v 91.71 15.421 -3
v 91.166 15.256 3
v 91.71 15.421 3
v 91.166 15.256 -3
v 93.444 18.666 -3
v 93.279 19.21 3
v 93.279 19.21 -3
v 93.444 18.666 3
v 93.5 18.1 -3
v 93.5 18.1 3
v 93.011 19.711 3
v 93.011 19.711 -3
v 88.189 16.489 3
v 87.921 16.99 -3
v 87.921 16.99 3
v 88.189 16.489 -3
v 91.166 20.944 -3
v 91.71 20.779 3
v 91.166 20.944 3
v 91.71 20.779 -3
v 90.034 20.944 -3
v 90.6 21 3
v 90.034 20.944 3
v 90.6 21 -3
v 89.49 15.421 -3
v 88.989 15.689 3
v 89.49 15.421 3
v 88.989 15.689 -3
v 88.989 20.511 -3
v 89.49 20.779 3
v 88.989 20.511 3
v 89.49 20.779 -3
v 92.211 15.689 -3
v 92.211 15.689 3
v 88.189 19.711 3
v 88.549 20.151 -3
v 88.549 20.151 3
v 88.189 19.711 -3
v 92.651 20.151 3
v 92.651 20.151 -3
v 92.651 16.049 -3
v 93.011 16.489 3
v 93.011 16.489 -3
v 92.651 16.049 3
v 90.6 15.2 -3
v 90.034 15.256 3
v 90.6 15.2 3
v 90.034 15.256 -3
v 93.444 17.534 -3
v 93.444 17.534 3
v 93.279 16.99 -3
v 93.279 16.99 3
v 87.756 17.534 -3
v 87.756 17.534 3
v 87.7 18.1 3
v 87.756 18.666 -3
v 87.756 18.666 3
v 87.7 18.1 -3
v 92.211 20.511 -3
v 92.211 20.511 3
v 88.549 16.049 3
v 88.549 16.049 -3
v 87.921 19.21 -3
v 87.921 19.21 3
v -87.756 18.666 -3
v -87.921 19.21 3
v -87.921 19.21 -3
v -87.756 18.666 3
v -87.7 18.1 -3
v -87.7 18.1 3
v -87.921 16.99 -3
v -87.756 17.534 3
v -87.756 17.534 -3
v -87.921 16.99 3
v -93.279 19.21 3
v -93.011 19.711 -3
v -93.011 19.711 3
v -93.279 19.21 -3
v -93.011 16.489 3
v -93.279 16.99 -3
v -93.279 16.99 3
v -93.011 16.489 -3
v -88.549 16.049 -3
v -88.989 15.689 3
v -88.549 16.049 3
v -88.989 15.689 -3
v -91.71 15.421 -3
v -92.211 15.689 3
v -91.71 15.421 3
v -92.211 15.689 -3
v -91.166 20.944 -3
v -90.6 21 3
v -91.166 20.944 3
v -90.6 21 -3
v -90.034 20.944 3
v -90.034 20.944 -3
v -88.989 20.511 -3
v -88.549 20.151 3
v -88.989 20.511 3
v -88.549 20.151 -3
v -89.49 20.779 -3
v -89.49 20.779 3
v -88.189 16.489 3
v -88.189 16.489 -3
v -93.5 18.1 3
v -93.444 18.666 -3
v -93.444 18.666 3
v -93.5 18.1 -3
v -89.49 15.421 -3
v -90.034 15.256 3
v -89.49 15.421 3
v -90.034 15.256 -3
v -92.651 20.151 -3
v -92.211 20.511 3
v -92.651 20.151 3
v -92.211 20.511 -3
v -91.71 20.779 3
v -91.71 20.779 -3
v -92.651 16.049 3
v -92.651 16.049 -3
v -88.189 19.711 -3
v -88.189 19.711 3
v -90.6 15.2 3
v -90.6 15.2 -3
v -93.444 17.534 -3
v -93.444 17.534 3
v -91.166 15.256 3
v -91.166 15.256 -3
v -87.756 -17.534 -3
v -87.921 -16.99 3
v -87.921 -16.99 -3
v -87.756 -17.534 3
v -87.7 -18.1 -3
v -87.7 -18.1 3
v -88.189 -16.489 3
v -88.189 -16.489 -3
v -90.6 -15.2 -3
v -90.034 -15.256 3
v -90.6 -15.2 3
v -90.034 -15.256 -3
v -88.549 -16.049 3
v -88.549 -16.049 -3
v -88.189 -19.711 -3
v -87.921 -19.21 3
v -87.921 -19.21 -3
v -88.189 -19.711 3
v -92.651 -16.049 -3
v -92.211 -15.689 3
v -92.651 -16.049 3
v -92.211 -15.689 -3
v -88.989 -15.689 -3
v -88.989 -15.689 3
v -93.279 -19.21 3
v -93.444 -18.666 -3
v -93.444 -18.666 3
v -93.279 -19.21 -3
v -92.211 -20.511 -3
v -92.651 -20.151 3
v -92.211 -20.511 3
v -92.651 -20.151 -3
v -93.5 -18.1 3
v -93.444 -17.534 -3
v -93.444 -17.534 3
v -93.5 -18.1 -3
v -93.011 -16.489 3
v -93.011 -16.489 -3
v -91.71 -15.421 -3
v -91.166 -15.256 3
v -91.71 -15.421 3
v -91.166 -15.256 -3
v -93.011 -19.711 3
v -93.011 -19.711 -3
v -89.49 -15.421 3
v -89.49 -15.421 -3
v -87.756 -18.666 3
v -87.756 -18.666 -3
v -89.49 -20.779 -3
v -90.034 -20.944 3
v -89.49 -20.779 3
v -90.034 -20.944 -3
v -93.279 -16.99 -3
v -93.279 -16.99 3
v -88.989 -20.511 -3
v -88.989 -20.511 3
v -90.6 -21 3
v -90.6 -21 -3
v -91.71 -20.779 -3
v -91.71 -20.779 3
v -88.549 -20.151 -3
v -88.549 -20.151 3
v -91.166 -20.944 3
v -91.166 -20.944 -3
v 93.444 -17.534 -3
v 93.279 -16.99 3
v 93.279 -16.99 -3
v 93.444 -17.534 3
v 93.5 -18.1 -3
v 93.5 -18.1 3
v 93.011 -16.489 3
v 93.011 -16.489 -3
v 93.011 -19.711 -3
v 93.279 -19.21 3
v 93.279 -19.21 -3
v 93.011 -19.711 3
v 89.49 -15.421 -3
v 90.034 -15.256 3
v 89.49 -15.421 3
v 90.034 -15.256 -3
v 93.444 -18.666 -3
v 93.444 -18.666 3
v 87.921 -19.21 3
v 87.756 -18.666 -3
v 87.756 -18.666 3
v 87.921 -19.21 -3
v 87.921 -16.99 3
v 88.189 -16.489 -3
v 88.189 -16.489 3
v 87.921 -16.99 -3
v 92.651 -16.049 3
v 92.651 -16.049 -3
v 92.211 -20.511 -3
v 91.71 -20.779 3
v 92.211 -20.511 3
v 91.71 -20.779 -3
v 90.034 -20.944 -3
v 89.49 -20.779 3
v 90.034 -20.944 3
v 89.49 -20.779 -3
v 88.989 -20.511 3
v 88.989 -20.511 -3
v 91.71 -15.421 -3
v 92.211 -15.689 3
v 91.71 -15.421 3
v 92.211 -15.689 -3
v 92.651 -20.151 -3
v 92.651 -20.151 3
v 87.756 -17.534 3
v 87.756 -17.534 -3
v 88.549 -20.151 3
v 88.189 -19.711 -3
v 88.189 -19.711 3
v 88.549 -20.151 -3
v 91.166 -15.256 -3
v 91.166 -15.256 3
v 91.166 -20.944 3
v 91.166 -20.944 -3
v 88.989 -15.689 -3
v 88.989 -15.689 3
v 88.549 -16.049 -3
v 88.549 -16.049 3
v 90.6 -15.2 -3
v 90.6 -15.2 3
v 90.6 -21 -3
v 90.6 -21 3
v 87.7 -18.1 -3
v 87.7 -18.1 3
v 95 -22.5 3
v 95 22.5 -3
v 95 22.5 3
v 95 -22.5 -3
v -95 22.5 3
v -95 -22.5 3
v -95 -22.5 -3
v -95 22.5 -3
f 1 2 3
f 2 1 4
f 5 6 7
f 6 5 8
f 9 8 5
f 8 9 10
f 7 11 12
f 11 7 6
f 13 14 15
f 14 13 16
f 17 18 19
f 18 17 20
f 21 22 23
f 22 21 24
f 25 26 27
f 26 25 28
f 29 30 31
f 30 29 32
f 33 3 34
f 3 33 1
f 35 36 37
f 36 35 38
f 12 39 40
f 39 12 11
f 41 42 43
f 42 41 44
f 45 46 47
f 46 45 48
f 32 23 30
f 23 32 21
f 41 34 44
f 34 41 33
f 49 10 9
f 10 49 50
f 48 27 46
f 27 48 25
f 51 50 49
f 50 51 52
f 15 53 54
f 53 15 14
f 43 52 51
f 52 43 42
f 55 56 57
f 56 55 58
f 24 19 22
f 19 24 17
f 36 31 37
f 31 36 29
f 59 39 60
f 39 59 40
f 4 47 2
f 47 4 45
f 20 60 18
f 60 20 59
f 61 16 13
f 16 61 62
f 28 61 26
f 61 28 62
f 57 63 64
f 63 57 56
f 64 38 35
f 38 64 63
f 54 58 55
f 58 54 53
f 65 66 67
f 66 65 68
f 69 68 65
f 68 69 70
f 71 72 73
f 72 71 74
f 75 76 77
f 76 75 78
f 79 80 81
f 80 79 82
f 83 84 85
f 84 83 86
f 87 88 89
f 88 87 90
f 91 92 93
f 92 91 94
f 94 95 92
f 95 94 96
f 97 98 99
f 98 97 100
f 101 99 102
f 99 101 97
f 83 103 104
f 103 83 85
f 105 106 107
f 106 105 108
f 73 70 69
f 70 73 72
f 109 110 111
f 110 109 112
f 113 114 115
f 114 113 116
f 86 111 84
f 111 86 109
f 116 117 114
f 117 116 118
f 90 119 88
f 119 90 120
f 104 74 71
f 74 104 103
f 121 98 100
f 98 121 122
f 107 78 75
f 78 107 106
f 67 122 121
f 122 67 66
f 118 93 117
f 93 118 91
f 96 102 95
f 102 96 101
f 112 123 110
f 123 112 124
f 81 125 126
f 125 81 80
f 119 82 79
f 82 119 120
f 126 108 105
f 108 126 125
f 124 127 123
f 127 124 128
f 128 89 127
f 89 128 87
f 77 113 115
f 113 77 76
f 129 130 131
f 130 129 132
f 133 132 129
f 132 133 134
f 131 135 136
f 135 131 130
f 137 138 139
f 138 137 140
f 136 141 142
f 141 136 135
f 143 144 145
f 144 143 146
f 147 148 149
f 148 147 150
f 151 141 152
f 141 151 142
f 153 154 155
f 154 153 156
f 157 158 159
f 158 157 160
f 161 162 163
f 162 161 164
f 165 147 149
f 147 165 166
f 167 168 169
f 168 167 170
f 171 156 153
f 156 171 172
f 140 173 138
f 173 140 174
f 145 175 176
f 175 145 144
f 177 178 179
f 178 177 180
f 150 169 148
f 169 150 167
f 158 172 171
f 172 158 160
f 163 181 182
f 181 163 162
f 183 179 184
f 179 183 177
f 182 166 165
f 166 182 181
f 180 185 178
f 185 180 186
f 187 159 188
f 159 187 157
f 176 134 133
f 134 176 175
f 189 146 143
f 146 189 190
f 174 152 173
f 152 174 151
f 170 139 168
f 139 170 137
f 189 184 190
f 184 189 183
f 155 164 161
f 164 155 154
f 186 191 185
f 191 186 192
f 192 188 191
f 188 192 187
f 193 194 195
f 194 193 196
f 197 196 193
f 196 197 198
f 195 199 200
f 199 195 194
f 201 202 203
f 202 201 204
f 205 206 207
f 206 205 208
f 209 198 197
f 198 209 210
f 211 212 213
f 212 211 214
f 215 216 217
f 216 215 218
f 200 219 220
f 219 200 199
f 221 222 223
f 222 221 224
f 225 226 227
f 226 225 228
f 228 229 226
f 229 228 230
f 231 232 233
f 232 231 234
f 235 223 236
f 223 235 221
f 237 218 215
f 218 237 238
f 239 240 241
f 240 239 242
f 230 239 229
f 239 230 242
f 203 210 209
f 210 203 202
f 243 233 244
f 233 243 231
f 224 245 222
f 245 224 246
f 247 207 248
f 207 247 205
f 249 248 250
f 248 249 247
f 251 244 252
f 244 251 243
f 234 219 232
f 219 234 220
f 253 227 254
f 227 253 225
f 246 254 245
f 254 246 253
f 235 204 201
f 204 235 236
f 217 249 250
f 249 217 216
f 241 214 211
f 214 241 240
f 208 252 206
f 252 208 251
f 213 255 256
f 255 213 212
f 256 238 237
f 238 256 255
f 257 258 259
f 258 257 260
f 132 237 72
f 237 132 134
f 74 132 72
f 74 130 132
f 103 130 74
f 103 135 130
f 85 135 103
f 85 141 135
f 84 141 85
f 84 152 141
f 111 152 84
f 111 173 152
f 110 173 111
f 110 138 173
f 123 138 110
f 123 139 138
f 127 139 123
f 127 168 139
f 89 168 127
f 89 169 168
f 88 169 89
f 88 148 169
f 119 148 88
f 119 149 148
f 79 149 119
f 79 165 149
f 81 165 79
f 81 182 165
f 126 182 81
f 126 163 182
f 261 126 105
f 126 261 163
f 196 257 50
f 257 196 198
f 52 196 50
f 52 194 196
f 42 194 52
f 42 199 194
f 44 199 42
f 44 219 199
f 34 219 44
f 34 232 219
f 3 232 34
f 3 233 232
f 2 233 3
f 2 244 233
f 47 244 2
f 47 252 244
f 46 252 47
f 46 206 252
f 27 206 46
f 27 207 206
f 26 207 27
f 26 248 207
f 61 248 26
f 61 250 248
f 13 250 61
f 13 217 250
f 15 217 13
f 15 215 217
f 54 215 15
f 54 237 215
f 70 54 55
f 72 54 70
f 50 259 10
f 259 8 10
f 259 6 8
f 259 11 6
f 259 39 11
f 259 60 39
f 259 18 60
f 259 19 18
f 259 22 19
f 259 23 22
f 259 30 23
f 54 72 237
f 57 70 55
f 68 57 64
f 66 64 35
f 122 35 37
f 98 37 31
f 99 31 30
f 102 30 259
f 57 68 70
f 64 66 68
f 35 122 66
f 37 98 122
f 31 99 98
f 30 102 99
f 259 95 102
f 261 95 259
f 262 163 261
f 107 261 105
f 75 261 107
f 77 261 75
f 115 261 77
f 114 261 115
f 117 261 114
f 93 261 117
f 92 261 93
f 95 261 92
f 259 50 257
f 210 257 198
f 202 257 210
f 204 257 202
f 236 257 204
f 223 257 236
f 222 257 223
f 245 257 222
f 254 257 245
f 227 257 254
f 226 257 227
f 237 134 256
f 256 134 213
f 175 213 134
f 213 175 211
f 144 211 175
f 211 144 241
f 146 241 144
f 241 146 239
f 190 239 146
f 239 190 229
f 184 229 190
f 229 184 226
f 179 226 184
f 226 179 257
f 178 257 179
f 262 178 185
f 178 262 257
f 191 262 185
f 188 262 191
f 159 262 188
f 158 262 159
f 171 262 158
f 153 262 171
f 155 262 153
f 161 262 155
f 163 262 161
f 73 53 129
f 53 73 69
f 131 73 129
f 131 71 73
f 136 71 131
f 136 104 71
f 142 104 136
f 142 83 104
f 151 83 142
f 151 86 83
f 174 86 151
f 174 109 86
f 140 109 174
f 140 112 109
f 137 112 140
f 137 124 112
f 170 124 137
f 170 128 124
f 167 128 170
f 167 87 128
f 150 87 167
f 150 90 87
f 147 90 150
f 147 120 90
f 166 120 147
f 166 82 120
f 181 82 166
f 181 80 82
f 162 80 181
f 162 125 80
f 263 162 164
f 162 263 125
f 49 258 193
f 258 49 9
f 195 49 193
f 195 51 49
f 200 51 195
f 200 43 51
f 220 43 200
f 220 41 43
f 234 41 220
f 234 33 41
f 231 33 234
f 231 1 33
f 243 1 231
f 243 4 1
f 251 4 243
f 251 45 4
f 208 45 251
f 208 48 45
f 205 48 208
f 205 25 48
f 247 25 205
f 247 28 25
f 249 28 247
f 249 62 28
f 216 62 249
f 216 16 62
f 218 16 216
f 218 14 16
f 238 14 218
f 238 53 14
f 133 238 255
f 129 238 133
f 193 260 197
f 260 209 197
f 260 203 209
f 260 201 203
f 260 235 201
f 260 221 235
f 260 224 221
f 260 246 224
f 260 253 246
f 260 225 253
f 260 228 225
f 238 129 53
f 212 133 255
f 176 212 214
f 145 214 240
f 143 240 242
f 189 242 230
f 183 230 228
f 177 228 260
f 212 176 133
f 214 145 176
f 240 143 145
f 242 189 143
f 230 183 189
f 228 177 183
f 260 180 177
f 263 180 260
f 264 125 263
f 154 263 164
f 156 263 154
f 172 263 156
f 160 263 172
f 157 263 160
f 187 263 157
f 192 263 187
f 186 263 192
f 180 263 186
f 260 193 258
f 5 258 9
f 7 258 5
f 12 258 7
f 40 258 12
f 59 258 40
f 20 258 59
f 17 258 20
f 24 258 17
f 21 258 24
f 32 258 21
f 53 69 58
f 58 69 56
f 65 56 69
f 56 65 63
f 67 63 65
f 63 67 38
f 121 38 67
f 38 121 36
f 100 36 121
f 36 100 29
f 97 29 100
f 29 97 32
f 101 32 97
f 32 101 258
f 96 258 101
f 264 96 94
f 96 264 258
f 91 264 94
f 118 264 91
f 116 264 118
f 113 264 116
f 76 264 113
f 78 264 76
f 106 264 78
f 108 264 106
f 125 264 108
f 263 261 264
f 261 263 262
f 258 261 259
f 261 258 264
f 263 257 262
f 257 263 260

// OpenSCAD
$fn = 32;

// ----------------------------------------------------------------------
// Corner plate 190 x 45 x 6
// 4 holes, centres taken from the edge offset
// ----------------------------------------------------------------------

// --- parameters (mm) ---
plate = [190, 45, 6];   // overall size (x, y, z)
holes = 4;              // number of holes the drawing asks for
bore_d = 5.5;           // nominal hole diameter from the drawing
print_allowance = 0.3;  // clearance added for printing
edge = 4.4;             // hole centre offset from the plate edge

// --- derived feature positions (mm) ---
hole_d = bore_d + print_allowance;  // = 5.8   hole diameter as printed
corner_x = plate[0] / 2 - edge;     // = 90.6   corner hole X
corner_y = plate[1] / 2 - edge;     // = 18.1   corner hole Y
feature_centers = [
  [corner_x, corner_y],
  [-corner_x, corner_y],
  [-corner_x, -corner_y],
  [corner_x, -corner_y]
];   // hole centres the loop below drills

// plate outline, every hole drilled through with the same cutters
difference() {
  cube(plate, center = true);
  for (centre = feature_centers)
    translate([centre[0], centre[1], 0])
      cylinder(d = hole_d, h = plate[2] + 2, center = true);
}
